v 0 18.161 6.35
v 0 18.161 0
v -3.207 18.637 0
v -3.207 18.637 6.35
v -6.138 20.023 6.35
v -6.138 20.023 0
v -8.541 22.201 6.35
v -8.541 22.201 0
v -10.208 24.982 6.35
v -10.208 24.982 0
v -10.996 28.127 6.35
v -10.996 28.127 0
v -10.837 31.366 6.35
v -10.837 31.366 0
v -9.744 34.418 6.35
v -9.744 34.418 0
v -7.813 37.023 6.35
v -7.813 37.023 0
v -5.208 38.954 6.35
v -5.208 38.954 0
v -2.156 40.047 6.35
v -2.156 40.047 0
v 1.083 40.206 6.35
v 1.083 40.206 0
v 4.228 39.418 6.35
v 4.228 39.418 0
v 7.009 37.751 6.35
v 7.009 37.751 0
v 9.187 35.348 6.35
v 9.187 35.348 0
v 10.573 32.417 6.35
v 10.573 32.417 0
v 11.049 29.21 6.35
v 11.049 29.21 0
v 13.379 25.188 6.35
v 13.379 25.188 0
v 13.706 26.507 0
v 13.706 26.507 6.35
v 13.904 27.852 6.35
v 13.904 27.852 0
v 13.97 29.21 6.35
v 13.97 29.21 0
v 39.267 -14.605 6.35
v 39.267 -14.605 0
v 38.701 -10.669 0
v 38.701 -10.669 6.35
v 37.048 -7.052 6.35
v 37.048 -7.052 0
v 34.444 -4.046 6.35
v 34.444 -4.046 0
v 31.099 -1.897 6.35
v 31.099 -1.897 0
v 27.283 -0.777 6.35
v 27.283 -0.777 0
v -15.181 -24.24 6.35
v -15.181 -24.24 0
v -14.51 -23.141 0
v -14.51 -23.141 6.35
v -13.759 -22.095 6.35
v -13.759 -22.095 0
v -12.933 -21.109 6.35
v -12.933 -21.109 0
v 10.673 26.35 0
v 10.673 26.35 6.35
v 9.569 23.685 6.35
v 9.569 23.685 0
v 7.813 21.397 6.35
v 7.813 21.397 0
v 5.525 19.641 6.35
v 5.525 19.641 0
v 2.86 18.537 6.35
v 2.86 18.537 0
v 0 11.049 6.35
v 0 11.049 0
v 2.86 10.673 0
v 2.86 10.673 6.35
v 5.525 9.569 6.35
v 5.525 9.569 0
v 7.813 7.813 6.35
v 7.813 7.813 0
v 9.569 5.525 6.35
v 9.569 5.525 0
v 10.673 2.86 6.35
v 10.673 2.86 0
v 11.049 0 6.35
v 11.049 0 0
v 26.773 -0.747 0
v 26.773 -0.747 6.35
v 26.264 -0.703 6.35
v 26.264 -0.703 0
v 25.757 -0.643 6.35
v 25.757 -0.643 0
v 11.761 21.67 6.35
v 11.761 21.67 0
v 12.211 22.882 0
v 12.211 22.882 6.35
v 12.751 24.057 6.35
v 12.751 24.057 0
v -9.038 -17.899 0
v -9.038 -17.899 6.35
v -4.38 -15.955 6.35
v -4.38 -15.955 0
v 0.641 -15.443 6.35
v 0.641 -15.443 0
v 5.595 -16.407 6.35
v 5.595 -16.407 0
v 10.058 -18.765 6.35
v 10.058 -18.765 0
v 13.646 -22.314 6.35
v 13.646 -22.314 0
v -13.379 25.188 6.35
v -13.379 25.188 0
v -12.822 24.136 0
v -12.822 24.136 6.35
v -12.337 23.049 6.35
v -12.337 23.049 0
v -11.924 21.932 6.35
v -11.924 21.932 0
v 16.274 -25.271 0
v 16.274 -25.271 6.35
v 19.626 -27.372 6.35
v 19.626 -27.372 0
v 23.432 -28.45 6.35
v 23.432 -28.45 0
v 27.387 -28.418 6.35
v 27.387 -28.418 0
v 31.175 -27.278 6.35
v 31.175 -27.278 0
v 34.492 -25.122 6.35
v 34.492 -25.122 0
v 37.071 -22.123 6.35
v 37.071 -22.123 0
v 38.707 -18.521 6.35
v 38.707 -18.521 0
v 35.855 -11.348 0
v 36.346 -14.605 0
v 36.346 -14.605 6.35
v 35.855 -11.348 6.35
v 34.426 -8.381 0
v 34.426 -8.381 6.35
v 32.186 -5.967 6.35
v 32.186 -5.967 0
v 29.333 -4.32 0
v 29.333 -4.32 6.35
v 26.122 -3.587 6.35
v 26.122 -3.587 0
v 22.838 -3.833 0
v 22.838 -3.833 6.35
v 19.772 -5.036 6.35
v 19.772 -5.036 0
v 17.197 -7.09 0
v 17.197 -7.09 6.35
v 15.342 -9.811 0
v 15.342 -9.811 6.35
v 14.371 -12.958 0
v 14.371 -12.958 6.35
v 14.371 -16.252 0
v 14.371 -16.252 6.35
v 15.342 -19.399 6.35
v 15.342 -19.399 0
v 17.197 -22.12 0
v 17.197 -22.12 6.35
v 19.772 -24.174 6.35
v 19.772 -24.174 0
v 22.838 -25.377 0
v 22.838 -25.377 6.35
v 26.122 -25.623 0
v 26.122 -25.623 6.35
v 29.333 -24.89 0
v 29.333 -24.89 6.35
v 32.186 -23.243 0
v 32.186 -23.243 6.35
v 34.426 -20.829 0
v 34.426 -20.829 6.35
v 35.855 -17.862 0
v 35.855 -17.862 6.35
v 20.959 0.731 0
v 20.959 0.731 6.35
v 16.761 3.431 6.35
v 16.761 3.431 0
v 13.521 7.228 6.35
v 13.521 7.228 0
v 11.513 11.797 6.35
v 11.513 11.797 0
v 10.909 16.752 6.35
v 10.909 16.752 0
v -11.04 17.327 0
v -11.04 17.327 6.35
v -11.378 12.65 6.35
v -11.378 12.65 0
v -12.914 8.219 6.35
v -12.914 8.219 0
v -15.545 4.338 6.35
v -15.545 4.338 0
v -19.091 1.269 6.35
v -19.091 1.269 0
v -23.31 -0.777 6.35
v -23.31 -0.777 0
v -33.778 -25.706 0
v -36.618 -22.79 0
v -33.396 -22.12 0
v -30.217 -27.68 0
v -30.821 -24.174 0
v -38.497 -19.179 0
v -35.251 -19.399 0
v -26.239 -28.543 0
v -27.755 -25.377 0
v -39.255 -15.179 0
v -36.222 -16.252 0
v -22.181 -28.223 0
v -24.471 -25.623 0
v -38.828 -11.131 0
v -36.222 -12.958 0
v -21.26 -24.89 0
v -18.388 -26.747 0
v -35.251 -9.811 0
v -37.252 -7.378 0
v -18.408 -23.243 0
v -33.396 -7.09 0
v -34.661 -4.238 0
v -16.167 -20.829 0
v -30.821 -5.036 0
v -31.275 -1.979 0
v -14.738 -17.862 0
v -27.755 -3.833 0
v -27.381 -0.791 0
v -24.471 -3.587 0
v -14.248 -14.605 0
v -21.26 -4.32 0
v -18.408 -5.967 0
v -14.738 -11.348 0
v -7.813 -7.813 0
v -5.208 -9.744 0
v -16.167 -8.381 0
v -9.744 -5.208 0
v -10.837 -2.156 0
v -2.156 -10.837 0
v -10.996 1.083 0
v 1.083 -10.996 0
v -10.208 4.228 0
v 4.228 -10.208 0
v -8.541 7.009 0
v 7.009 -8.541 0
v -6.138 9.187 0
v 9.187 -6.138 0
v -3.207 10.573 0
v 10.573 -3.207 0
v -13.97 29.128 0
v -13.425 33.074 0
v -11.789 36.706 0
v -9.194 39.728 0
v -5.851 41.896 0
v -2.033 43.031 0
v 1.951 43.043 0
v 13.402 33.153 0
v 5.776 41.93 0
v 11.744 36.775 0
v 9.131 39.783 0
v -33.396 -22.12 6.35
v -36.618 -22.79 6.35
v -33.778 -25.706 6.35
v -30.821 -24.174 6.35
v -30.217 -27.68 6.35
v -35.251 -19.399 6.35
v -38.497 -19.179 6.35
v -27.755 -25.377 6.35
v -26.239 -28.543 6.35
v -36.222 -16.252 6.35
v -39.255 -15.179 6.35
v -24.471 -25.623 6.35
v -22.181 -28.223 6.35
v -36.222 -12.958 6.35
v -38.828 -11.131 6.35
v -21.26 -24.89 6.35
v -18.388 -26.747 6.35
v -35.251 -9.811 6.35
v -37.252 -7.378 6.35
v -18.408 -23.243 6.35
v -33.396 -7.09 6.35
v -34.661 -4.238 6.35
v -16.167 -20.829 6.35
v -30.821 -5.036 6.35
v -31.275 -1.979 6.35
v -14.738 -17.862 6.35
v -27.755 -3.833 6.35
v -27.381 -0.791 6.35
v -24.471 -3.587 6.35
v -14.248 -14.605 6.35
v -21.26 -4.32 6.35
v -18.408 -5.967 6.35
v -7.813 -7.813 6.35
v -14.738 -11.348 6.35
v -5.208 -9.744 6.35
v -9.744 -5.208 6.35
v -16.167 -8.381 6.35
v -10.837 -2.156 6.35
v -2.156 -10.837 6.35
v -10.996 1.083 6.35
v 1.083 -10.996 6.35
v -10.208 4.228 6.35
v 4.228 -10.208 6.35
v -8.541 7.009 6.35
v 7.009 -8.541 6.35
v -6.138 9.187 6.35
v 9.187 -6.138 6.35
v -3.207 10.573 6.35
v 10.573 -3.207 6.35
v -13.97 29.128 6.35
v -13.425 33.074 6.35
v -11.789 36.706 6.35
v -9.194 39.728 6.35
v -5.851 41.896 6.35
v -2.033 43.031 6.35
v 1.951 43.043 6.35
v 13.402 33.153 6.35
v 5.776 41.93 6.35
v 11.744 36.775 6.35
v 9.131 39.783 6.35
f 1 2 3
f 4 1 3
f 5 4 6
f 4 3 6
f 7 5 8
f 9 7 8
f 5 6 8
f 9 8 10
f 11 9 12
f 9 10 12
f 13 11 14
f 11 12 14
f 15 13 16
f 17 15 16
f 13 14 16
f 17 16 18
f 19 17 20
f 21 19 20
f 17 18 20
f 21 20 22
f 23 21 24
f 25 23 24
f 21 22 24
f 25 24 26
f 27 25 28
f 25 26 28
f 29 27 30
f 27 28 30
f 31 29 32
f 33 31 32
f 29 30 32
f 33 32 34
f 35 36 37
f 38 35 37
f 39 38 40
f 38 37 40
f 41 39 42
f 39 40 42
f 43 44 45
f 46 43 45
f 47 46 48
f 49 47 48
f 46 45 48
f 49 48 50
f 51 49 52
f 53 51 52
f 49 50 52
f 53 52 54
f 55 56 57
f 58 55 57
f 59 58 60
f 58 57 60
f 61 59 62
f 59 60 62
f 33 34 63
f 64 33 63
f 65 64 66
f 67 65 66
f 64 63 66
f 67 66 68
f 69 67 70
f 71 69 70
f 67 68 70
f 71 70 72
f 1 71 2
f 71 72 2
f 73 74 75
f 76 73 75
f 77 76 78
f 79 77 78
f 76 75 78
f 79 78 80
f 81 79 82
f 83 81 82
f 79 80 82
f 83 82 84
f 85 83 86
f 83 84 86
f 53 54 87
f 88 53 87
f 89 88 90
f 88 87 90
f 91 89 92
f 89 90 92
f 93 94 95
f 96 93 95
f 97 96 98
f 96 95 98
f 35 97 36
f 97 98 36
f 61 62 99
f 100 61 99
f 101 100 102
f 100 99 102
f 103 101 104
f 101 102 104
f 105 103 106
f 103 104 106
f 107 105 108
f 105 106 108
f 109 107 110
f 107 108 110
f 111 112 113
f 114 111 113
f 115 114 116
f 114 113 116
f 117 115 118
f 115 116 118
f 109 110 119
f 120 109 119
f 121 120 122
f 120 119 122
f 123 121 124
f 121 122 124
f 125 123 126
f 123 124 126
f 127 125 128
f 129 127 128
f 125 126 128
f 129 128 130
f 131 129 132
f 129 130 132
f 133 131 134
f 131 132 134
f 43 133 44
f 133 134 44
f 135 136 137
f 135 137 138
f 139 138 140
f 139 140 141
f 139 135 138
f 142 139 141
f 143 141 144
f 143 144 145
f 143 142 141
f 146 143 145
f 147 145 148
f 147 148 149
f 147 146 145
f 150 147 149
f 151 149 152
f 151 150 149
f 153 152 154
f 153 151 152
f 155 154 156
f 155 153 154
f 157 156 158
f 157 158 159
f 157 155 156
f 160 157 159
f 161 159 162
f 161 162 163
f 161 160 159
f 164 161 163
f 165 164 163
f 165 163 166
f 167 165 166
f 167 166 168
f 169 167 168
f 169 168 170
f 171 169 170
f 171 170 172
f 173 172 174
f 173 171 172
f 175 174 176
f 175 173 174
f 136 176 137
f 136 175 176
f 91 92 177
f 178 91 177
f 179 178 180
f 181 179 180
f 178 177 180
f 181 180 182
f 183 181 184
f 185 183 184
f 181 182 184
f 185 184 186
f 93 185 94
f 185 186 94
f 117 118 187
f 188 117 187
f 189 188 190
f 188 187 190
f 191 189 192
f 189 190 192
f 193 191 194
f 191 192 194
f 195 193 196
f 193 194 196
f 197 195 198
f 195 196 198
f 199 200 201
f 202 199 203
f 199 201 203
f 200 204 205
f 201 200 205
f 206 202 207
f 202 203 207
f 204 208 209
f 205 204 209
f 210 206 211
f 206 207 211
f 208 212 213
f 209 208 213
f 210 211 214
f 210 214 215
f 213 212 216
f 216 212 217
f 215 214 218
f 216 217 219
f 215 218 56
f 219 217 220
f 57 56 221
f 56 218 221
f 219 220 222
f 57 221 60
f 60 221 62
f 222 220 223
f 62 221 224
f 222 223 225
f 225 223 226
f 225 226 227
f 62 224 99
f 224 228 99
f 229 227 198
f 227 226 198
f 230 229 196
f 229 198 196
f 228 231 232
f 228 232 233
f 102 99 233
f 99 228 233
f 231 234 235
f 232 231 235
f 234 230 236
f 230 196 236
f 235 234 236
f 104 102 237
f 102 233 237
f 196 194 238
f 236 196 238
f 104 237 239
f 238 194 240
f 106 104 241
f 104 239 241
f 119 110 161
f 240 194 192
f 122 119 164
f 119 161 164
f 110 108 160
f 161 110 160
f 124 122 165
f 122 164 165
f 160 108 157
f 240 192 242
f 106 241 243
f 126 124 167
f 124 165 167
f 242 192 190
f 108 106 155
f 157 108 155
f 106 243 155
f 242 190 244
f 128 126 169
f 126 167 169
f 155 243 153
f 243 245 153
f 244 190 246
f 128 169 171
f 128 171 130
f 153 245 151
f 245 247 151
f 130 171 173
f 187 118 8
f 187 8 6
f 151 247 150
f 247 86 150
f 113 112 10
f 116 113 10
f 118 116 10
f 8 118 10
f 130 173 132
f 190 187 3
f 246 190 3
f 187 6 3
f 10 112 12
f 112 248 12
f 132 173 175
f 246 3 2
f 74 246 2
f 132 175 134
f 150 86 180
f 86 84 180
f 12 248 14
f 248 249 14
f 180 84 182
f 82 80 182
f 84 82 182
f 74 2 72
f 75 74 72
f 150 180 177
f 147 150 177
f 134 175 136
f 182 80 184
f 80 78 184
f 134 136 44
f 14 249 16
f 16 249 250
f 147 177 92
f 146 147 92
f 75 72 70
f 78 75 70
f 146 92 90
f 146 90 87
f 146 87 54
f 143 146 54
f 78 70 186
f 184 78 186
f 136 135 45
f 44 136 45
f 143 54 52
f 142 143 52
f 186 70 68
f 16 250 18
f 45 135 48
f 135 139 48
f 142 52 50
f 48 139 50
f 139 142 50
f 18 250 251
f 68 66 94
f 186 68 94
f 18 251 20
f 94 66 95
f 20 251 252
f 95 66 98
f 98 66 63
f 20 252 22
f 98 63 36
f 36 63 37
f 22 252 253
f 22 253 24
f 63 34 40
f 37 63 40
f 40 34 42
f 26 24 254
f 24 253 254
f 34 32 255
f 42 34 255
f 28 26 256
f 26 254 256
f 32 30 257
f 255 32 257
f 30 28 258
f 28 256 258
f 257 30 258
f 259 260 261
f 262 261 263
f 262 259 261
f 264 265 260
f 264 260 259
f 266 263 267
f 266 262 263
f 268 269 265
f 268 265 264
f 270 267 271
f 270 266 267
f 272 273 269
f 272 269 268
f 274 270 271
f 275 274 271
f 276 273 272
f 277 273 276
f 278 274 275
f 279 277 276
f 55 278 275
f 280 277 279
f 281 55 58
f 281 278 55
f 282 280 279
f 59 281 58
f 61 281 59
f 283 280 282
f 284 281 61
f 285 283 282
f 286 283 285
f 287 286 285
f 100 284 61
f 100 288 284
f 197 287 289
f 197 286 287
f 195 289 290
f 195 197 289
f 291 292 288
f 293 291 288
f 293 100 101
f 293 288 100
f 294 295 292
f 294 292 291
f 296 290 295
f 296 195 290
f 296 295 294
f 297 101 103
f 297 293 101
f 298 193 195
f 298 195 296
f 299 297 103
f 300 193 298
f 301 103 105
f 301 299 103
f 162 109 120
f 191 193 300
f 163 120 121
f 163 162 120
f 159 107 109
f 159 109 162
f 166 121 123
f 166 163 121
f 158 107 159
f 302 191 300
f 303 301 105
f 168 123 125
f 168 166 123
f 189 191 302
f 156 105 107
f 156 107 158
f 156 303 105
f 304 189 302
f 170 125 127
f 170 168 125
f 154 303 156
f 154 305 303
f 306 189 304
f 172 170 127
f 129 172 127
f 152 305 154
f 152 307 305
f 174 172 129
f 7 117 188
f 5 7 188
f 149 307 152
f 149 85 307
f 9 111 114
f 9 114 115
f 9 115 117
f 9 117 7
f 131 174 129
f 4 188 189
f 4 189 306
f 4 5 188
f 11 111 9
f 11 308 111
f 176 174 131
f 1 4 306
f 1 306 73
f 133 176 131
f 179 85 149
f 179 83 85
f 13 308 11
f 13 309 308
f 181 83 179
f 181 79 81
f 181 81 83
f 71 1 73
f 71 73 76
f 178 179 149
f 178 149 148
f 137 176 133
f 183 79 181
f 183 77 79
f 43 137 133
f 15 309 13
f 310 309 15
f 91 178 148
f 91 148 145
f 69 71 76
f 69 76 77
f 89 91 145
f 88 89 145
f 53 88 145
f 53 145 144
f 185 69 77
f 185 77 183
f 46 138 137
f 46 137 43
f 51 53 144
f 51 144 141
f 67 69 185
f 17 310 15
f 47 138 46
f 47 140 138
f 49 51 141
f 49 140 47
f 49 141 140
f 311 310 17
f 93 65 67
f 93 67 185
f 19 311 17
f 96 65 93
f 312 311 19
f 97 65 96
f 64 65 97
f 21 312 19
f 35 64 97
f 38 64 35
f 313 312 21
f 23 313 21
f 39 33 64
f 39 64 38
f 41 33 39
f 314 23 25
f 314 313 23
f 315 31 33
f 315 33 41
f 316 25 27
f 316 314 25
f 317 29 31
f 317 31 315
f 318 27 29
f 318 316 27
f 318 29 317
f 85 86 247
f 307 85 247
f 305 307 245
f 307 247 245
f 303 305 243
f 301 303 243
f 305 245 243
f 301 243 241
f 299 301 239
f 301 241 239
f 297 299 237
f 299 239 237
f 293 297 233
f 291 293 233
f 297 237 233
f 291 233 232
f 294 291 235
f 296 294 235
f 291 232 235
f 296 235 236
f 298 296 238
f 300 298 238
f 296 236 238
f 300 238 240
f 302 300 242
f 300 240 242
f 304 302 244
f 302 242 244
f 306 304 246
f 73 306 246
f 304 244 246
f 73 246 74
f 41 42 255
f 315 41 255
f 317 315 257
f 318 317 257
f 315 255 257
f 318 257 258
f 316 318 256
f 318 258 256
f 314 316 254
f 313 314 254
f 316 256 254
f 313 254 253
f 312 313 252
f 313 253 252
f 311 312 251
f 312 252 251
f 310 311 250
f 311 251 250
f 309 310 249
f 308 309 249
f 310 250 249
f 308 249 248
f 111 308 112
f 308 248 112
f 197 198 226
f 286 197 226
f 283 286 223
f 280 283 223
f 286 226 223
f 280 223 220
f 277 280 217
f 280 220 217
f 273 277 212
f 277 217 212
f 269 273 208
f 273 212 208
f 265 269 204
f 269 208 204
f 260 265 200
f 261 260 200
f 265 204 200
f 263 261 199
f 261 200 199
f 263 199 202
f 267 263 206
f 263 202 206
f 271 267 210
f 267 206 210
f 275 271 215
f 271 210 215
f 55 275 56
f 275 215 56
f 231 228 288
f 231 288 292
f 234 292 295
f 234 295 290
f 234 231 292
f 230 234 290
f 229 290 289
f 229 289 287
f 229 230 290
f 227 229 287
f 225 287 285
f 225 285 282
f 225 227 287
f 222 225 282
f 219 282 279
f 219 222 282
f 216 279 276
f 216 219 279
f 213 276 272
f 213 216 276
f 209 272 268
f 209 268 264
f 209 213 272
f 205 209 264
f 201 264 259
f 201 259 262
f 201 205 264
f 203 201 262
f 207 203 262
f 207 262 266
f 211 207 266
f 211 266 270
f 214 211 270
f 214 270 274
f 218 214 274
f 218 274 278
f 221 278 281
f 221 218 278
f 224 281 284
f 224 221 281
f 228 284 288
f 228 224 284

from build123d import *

# Parameters (mm, degrees)
F1_DEPTH = 6.35
F0_R     = 11.049
F2_DEPTH = 6.35
F3_DEPTH = 6.35
F4_DEPTH = 6.35
F5_DEPTH = 6.35


with BuildPart() as f1:
    # F0 (on Top) → F1 (new body)
    with BuildSketch(Plane.XY):
        with BuildLine():
            ThreePointArc((11.760597, 21.670156), (6.701838, 16.952502), (0, 15.24))
            ThreePointArc((0, 15.24), (-6.836853, 17.027293), (-11.924319, 21.931847))
            ThreePointArc((-11.924319, 21.931847), (-12.914458, 8.219461), (-23.310372, -0.77692))
            ThreePointArc((-23.310372, -0.77692), (-14.739412, -5.455867), (-11.326602, -14.605))
            ThreePointArc((-11.326602, -14.605), (-11.734078, -17.954455), (-12.932736, -21.108517))
            ThreePointArc((-12.932736, -21.108517), (0.641019, -15.443026), (13.646185, -22.313999))
            ThreePointArc((13.646185, -22.313999), (13.101766, -7.789805), (25.757442, -0.642603))
            ThreePointArc((25.757442, -0.642603), (13.520656, 7.227739), (11.760597, 21.670156))
        make_face()
        with BuildLine():
            ThreePointArc((13.97, 0), (-9.878282, -9.878282), (0, 13.97))
            ThreePointArc((0, 13.97), (9.878282, 9.878282), (13.97, 0))
        make_face(mode=Mode.SUBTRACT)
    extrude(amount=F1_DEPTH)

    # F0 (on Top) → F2 (join)
    with BuildSketch(Plane.XY):
        with BuildLine():
            ThreePointArc((-11.326602, -14.605), (-14.739412, -5.455867), (-23.310372, -0.77692))
            ThreePointArc((-23.310372, -0.77692), (-38.496664, -19.178757), (-15.180625, -24.239724))
            ThreePointArc((-15.180625, -24.239724), (-14.144468, -22.611098), (-12.932736, -21.108517))
            ThreePointArc((-12.932736, -21.108517), (-11.734078, -17.954455), (-11.326602, -14.605))
        make_face()
        with Locations((-25.296602, -14.605)):
            Circle(F0_R, mode=Mode.SUBTRACT)
    extrude(amount=F2_DEPTH)

    # F0 (on Top) → F3 (join)
    with BuildSketch(Plane.XY):
        with BuildLine():
            ThreePointArc((27.282832, -0.77692), (26.518634, -0.726829), (25.757442, -0.642603))
            ThreePointArc((25.757442, -0.642603), (13.101766, -7.789805), (13.646185, -22.313999))
            ThreePointArc((13.646185, -22.313999), (29.321808, -27.982541), (39.266602, -14.605))
            ThreePointArc((39.266602, -14.605), (35.853792, -5.455867), (27.282832, -0.77692))
        make_face()
        with Locations((25.296602, -14.605)):
            Circle(F0_R, mode=Mode.SUBTRACT)
    extrude(amount=F3_DEPTH)

    # F0 (on Top) → F4 (join)
    with BuildSketch(Plane.XY):
        with BuildLine():
            ThreePointArc((-11.924319, 21.931847), (-6.836853, 17.027293), (0, 15.24))
            ThreePointArc((0, 15.24), (6.701838, 16.952502), (11.760597, 21.670156))
            ThreePointArc((11.760597, 21.670156), (12.469752, 23.474968), (13.378501, 25.187983))
            ThreePointArc((13.378501, 25.187983), (13.821334, 27.177361), (13.97, 29.21))
            ThreePointArc((13.97, 29.21), (-2.032639, 43.031334), (-13.378501, 25.187983))
            ThreePointArc((-13.378501, 25.187983), (-12.57041, 23.59609), (-11.924319, 21.931847))
        make_face()
        with BuildLine():
            ThreePointArc((11.049, 29.21), (7.812823, 21.397177), (0, 18.161))
            ThreePointArc((0, 18.161), (-7.812823, 37.022823), (11.049, 29.21))
        make_face(mode=Mode.SUBTRACT)
    extrude(amount=F4_DEPTH)

    # F0 (on Top) → F5 (join)
    with BuildSketch(Plane.XY):
        with BuildLine():
            ThreePointArc((13.97, 0), (9.878282, 9.878282), (0, 13.97))
            ThreePointArc((0, 13.97), (-9.878282, -9.878282), (13.97, 0))
        make_face()
        with BuildLine():
            ThreePointArc((0, 11.049), (7.812823, 7.812823), (11.049, 0))
            ThreePointArc((11.049, 0), (-7.812823, -7.812823), (0, 11.049))
        make_face(mode=Mode.SUBTRACT)
    extrude(amount=F5_DEPTH)


solid = f1.part
